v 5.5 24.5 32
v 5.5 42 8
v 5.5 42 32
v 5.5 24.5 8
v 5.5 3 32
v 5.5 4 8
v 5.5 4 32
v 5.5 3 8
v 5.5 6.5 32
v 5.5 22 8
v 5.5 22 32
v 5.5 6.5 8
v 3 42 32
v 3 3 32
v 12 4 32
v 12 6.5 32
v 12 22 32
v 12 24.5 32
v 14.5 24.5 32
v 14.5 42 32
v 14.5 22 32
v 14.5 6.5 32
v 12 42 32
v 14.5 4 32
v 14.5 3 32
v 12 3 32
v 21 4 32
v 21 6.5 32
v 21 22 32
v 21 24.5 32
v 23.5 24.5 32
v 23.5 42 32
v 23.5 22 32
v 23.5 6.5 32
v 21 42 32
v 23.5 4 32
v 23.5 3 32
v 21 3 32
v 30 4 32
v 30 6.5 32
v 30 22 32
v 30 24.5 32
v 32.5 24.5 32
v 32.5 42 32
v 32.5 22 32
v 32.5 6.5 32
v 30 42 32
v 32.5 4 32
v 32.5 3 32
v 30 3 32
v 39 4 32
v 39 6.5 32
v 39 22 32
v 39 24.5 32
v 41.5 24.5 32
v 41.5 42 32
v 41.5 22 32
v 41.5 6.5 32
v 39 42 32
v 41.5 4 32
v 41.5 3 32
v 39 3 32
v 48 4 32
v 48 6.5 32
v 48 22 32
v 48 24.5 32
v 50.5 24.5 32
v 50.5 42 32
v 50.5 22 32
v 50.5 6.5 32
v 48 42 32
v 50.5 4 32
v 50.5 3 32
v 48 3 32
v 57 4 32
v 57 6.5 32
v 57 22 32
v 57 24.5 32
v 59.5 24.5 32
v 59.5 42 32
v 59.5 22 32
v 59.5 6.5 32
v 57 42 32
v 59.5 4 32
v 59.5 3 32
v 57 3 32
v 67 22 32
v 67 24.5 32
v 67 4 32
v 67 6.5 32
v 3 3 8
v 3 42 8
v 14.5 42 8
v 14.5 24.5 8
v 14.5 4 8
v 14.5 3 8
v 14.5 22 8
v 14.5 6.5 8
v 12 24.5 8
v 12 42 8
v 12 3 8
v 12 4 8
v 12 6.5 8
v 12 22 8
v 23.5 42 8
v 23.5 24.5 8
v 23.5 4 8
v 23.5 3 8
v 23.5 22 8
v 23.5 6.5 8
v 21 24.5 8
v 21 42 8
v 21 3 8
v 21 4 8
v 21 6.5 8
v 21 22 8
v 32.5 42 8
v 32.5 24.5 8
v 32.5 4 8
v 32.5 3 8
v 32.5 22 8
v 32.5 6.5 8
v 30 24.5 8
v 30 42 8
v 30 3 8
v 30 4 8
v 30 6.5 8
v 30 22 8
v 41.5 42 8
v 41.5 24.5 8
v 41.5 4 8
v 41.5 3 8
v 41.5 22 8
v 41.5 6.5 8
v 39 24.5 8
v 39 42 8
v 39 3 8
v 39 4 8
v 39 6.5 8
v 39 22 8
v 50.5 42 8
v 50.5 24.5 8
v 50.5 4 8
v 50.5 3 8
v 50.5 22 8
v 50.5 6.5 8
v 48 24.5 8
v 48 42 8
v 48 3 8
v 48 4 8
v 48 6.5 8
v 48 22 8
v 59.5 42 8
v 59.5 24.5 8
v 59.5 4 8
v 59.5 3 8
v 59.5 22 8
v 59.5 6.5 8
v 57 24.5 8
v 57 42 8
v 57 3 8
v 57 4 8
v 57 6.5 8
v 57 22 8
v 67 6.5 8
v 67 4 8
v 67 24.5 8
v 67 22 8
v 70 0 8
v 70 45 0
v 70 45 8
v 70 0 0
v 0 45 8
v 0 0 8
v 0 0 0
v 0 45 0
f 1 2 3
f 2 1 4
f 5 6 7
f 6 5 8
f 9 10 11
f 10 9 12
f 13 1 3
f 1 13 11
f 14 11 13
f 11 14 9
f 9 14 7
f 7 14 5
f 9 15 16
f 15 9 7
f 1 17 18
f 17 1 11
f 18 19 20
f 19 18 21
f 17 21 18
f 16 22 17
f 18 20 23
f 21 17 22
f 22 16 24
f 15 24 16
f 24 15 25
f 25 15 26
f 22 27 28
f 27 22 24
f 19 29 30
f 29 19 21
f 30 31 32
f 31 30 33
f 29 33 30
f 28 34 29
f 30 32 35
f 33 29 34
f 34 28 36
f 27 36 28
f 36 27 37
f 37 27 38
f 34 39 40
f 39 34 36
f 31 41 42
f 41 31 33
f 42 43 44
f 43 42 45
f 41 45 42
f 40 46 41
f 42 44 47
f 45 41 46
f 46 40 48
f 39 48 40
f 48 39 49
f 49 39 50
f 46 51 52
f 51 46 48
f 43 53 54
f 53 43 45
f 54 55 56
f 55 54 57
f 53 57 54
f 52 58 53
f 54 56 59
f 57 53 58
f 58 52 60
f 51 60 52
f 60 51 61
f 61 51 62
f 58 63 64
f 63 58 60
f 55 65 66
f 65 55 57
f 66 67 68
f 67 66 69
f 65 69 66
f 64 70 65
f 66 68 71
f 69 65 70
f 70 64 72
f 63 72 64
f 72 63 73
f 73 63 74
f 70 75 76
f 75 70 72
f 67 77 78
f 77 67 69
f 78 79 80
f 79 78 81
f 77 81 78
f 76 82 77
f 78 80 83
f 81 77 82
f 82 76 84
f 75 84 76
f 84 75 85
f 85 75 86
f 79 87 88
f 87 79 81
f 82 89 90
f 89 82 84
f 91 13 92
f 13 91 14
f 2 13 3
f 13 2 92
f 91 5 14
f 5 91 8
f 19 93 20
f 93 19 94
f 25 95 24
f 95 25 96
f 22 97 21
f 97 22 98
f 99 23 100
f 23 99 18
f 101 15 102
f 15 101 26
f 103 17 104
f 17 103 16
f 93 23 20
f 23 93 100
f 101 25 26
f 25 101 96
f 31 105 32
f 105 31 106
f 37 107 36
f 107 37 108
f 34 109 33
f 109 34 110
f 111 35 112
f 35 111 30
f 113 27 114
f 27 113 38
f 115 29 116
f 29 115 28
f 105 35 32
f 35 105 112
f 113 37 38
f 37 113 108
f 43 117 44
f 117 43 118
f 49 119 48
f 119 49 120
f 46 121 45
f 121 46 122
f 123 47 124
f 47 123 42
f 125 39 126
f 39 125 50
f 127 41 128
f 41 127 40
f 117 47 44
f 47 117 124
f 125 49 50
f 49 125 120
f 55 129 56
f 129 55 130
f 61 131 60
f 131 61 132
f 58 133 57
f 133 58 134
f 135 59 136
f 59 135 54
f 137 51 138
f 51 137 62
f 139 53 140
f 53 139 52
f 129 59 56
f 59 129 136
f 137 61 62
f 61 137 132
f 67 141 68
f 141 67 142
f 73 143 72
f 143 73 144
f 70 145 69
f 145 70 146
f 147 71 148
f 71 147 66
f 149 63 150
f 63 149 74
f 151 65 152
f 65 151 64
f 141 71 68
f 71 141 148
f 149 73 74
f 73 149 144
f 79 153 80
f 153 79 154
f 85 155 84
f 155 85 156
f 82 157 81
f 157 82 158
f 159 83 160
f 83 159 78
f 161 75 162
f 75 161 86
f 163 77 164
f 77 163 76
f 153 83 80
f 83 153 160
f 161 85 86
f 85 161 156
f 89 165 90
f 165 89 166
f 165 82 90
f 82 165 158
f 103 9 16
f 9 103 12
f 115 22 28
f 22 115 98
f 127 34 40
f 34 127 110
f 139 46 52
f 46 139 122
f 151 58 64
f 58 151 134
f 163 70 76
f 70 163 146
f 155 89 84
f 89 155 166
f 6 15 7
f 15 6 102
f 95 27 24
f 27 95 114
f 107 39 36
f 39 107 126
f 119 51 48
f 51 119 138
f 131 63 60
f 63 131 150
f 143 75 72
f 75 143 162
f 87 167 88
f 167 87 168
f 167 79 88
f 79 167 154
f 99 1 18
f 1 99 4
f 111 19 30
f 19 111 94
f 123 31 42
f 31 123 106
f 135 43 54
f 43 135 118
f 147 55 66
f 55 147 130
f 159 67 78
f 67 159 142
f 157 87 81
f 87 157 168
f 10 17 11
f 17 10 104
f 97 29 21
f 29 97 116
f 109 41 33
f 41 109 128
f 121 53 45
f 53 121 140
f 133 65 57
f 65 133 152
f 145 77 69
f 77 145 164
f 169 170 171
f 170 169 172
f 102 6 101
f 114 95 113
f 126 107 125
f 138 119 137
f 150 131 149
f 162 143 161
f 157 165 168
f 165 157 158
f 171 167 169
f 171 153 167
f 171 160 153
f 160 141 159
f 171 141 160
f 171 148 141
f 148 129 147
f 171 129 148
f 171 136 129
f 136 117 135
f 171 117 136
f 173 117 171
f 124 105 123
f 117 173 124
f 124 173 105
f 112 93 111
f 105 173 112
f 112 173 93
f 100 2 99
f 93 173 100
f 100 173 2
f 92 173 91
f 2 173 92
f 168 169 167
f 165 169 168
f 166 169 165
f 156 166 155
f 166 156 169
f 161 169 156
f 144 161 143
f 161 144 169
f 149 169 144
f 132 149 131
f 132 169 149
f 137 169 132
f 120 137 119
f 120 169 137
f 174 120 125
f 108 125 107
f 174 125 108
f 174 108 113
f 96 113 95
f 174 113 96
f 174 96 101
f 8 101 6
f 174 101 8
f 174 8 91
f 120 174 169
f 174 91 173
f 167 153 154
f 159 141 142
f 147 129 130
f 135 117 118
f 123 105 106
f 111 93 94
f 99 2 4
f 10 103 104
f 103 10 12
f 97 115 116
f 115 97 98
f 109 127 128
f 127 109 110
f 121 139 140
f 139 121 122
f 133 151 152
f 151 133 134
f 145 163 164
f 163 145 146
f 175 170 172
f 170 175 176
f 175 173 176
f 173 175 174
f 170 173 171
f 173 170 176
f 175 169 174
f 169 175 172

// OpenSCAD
$fn = 32;

// ----------------------------------------------------------------------
// Heatsink: cross fin block
// ----------------------------------------------------------------------

// --- parameters (mm) ---
base_l = 70;              // base length, X
base_w = 45;              // base width, Y
base_t = 8;               // base plate thickness
fin_h = 25;               // fin height above the base
fin_t = 2.5;              // fin thickness
edge = 3;                 // margin from the base ends
pitch = 9;                // fin pitch
rib_pitch = 18;           // cross rib pitch

n_fins = floor((base_l - 2 * edge - fin_t) / pitch) + 1;  // fin count
total_h = base_t + fin_h - 1;  // overall height
n_ribs = floor((base_w - 2 * edge) / rib_pitch);  // rib count

union() {
  cube([base_l, base_w, base_t]);
  for (i = [0 : n_fins - 1])
    translate([edge + i * pitch, edge, base_t - 1])
      cube([fin_t, base_w - 2 * edge, fin_h]);
  for (i = [0 : n_ribs - 1])
    translate([edge, edge + 1 + i * rib_pitch, base_t - 1])
      cube([base_l - 2 * edge, fin_t, fin_h]);
}
